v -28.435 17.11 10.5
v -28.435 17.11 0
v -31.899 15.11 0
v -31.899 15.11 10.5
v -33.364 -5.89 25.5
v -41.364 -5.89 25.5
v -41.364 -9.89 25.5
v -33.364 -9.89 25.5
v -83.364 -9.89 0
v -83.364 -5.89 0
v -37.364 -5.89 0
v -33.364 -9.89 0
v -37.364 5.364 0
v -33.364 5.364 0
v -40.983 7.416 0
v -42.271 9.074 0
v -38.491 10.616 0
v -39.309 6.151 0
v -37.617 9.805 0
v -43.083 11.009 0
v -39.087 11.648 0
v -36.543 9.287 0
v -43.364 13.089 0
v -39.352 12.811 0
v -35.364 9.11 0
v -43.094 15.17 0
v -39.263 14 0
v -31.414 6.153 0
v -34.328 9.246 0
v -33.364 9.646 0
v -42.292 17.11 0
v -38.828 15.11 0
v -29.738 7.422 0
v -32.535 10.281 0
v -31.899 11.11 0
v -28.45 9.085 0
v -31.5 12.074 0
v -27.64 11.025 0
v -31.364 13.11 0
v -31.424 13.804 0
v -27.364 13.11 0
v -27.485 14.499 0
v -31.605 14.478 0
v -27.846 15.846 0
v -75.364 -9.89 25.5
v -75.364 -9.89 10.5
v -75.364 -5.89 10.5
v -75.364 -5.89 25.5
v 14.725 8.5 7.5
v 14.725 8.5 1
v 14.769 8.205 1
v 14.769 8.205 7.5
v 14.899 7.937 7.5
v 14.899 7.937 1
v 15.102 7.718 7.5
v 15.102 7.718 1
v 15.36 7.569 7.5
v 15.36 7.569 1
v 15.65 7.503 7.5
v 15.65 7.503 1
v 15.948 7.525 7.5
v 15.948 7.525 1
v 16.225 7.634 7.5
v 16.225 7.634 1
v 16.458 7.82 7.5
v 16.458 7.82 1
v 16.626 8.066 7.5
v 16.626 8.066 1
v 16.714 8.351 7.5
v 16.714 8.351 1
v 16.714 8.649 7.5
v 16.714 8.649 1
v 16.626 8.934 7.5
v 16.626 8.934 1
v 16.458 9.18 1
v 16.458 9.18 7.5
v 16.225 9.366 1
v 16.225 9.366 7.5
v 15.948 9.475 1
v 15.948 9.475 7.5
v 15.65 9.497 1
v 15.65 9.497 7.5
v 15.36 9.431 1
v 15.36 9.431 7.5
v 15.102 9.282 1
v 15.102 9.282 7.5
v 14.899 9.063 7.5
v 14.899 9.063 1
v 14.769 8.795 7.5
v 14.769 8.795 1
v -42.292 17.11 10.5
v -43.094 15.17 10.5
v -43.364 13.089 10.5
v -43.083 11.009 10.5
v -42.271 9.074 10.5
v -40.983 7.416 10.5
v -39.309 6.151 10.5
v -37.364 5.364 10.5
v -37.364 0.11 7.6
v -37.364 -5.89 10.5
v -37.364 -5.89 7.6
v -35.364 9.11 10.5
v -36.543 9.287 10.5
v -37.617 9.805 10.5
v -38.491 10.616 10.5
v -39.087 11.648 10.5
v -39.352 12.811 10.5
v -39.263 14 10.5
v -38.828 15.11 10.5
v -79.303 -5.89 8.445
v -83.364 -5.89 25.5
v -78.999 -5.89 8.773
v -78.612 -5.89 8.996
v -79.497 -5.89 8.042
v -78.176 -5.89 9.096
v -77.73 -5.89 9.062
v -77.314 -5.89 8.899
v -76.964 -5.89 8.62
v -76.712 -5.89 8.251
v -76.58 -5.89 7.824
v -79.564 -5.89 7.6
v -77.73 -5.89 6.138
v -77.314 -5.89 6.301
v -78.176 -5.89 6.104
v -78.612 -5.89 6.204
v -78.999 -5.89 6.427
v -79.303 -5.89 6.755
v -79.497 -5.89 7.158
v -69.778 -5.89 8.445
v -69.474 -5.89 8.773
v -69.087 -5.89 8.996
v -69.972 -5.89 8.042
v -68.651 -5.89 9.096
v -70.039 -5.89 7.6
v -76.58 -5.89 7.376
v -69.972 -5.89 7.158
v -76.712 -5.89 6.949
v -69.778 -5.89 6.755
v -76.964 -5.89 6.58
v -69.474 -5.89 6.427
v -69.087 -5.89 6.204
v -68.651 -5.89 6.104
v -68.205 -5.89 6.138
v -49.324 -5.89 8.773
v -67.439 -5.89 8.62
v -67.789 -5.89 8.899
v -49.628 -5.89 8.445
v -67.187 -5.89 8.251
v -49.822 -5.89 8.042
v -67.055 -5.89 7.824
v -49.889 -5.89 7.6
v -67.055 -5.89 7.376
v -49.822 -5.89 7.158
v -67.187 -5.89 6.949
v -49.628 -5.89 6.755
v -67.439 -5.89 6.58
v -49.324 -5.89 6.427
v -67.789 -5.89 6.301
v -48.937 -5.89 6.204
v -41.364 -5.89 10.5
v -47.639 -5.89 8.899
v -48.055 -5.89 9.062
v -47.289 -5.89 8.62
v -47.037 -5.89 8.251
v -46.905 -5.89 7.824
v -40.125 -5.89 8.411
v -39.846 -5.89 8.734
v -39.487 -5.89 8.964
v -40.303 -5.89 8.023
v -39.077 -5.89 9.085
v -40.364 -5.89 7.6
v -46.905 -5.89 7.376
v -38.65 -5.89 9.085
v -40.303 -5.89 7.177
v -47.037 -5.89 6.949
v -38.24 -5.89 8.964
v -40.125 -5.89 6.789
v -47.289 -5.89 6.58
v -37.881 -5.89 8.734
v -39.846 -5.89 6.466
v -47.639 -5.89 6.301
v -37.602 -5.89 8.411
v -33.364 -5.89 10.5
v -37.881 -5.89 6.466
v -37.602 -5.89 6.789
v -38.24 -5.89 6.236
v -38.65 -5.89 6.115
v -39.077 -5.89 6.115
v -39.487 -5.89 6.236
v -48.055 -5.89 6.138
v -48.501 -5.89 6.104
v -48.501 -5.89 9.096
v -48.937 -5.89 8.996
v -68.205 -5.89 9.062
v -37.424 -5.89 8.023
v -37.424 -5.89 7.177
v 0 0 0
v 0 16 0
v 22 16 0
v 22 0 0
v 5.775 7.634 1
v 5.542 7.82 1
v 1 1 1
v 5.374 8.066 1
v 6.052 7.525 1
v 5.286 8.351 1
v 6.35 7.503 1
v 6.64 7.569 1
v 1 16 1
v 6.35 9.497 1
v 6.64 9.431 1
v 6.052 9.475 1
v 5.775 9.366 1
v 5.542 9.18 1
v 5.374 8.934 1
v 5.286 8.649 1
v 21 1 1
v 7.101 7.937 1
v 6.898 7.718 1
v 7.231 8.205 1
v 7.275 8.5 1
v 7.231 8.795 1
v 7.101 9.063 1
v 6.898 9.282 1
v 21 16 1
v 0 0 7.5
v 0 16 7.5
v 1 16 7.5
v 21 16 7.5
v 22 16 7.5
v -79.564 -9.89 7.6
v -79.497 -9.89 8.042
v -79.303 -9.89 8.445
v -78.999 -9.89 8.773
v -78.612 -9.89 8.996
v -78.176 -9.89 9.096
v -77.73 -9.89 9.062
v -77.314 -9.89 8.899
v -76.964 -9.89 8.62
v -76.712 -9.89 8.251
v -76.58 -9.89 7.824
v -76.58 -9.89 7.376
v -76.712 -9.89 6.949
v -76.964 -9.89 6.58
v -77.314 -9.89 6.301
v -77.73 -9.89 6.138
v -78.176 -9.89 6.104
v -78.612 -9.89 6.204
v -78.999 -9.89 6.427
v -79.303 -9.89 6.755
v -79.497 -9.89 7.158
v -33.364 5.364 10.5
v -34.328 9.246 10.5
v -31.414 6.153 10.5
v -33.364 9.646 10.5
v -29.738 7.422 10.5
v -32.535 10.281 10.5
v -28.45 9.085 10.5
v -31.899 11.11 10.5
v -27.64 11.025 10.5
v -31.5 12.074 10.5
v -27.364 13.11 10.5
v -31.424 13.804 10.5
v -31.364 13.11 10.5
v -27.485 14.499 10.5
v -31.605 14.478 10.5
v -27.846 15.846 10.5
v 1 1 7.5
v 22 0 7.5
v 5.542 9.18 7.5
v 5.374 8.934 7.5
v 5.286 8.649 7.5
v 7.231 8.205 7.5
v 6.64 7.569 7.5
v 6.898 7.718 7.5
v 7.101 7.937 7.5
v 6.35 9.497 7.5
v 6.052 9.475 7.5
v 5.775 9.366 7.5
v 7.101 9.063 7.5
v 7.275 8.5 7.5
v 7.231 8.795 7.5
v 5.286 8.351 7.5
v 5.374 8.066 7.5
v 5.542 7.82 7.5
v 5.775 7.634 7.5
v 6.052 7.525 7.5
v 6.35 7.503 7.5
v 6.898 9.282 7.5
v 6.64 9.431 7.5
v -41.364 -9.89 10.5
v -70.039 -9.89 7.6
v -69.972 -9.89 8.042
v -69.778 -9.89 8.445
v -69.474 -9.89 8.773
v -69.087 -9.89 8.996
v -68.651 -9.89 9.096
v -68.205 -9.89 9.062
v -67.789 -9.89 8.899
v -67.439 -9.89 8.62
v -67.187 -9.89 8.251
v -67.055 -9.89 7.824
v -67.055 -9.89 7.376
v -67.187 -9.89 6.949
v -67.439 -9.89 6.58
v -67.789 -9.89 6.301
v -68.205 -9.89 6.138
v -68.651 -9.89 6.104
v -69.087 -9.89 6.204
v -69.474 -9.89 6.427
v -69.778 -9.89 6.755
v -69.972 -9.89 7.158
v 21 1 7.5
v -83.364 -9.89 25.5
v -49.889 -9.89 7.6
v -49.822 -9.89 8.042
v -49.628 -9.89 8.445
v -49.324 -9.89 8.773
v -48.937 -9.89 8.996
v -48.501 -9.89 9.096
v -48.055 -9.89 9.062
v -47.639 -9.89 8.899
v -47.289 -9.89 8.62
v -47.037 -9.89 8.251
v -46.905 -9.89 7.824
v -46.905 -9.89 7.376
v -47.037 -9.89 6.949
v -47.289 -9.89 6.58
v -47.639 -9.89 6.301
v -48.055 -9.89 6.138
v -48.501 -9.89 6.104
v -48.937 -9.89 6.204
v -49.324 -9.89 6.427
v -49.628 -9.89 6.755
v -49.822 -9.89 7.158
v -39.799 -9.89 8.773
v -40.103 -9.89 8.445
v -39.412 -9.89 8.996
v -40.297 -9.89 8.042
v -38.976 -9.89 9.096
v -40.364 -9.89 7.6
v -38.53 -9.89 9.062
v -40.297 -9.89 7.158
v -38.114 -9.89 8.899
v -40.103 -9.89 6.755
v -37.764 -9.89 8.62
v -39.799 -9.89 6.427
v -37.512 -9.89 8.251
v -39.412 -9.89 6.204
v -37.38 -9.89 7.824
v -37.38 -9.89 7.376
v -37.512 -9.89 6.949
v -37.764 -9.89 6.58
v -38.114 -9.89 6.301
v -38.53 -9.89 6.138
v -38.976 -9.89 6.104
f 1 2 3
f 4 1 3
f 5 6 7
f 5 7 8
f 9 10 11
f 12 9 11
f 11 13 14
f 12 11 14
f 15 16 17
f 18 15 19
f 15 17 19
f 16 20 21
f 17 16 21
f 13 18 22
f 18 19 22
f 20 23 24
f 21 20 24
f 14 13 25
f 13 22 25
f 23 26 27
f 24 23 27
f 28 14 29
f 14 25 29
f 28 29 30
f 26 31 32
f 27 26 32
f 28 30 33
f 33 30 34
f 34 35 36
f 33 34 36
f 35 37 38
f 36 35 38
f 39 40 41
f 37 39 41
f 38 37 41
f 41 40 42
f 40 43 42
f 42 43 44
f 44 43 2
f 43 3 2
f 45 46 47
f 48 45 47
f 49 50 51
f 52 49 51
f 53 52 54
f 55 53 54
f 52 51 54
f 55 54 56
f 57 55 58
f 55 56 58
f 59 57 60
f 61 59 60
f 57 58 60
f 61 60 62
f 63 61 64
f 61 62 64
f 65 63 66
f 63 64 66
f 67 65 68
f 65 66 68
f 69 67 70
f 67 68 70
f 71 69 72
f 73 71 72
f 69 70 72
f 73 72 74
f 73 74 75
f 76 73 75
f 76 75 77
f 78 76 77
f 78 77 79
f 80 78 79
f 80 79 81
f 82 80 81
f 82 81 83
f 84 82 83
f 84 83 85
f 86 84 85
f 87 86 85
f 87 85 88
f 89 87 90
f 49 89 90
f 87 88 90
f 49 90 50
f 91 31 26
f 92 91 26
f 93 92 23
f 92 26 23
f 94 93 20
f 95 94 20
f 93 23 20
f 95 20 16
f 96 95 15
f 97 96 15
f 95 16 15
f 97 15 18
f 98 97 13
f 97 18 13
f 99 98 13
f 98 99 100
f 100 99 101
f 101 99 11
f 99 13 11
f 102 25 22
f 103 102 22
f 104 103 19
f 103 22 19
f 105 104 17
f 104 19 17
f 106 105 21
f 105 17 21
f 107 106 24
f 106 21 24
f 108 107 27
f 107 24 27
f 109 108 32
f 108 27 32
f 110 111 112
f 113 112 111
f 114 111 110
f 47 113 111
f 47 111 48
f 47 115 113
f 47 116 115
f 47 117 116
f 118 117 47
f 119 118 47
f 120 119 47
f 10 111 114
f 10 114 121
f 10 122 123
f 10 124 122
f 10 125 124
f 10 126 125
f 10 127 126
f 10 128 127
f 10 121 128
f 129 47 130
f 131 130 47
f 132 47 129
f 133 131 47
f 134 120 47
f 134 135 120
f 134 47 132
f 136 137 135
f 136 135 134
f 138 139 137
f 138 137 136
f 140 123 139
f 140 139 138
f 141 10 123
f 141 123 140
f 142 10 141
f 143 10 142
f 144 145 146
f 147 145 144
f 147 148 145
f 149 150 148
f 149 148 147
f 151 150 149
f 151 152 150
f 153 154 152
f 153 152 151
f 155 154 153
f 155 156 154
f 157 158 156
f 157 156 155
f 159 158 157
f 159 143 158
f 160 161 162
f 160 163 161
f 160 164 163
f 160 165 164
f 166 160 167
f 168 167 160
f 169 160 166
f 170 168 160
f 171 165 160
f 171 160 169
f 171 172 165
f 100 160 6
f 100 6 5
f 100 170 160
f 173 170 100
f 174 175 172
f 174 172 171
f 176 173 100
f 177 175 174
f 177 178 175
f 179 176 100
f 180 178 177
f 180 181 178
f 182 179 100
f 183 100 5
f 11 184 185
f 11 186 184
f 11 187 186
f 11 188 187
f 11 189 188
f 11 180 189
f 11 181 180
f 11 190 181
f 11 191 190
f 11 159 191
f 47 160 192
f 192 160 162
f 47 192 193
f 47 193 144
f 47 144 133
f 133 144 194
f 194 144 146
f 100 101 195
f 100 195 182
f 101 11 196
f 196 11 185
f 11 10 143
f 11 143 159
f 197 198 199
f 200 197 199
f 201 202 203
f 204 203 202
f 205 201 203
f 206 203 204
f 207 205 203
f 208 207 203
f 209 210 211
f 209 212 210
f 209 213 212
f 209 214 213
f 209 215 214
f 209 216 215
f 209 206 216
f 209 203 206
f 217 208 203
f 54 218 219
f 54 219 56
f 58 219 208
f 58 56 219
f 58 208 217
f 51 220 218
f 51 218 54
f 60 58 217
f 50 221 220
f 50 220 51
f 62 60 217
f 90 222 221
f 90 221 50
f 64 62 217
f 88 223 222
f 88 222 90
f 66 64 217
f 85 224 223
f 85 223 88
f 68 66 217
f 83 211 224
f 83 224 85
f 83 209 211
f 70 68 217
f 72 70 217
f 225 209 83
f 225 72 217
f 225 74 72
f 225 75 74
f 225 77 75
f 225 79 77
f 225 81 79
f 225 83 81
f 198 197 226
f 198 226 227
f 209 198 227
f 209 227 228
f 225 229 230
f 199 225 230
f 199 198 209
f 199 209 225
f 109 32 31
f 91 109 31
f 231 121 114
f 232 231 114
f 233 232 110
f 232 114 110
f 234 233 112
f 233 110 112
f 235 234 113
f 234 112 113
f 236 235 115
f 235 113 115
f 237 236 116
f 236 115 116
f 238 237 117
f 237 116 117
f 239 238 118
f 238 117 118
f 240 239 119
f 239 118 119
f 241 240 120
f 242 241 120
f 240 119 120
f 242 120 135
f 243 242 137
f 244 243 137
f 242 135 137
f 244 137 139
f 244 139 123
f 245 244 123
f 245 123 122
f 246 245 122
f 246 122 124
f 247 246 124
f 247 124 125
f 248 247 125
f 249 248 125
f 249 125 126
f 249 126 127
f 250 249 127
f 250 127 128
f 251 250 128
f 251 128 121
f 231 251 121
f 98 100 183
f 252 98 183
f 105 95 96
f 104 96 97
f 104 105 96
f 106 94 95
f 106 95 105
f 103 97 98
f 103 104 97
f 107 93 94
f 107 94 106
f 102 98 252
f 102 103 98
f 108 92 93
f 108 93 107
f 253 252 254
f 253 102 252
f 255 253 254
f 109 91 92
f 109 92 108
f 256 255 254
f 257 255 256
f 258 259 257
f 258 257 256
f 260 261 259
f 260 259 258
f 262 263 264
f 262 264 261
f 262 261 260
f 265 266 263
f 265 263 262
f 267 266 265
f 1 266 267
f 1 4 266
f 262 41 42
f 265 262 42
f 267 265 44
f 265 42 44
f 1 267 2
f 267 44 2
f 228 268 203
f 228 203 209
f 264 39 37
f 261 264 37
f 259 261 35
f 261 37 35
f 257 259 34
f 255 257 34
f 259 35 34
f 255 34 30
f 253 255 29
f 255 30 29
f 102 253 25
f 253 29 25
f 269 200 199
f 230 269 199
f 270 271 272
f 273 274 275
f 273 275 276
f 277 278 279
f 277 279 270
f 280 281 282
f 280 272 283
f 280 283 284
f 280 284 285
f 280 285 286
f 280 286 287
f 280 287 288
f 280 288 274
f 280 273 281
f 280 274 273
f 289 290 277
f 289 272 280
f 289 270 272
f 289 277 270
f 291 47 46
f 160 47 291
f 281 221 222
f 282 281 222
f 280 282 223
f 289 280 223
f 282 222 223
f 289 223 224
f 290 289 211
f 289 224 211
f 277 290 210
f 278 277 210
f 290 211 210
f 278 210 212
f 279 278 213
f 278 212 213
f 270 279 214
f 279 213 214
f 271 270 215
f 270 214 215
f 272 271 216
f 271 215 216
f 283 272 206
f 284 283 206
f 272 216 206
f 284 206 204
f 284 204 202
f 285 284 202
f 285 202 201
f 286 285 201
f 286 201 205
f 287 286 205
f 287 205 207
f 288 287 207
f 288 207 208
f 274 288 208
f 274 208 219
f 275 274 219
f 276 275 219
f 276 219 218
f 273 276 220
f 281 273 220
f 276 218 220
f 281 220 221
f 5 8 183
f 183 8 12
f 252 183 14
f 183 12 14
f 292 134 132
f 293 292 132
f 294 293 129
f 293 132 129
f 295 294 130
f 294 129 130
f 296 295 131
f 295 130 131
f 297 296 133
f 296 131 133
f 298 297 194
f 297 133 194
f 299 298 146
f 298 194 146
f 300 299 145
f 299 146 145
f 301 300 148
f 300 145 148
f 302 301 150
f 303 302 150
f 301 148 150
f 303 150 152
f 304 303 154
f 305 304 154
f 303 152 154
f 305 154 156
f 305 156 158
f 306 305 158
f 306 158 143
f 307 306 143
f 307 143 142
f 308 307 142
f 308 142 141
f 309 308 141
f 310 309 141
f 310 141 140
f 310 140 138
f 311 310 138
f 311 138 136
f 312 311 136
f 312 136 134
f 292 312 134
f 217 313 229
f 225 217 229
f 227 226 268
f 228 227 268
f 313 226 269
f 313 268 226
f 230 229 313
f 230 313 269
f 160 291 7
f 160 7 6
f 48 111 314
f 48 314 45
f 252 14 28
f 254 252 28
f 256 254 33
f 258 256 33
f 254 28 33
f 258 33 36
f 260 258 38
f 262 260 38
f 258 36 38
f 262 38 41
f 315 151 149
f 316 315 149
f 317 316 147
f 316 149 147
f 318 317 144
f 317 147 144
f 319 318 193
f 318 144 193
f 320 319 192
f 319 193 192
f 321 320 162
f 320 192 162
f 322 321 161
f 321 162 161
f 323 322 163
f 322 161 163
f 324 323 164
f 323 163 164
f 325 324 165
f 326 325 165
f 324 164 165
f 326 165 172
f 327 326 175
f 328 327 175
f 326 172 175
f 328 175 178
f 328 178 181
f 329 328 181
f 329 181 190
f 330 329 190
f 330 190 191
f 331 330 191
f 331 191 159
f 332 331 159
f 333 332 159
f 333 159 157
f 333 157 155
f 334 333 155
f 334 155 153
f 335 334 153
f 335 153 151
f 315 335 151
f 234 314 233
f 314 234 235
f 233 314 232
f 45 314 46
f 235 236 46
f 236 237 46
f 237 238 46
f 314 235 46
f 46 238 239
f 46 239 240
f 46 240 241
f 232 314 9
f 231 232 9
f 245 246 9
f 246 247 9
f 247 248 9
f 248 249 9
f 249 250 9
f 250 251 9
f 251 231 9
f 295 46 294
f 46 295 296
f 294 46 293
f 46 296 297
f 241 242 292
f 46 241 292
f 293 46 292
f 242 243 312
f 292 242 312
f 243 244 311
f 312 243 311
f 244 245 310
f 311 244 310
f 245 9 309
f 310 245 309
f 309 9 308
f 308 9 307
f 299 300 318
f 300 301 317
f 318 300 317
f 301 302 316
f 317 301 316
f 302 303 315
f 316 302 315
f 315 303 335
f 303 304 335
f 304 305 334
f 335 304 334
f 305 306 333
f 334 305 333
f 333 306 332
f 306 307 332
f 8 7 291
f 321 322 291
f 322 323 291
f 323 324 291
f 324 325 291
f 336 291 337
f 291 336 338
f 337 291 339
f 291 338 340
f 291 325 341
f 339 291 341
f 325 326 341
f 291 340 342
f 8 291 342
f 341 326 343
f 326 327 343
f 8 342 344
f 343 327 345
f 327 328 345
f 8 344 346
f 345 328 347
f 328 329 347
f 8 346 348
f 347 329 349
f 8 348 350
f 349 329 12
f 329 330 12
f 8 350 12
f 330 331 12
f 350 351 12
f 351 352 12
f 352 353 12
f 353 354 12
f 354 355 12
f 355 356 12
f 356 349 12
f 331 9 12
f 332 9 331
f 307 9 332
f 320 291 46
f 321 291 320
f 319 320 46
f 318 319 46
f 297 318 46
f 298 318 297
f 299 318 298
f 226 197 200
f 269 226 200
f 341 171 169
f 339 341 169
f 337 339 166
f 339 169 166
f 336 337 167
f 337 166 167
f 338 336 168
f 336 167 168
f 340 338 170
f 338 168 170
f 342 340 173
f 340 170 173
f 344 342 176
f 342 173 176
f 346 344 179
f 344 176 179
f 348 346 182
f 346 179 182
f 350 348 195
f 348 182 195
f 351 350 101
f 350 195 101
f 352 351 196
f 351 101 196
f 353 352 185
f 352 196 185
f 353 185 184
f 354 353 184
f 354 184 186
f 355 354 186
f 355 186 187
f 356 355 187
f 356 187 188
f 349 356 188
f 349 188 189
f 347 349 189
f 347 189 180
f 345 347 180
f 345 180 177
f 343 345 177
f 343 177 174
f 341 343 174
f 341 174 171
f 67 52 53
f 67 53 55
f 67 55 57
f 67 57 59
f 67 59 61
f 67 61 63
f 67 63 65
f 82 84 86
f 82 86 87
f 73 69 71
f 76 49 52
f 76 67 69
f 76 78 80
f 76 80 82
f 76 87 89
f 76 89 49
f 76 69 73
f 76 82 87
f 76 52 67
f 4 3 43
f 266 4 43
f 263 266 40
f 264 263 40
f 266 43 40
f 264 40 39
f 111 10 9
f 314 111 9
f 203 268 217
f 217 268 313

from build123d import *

# Parameters (mm, degrees)
F0_W      = 22
F0_H      = 16
F1_DEPTH  = 7.5
F2_W      = 20
F2_H      = 15
F3_DEPTH  = 6.5
F5_DEPTH  = 6.5
F7_DEPTH  = 10.5
F9_W      = 8
F9_H      = 4
F10_DEPTH = 15
F12_D     = 3
F12_DEPTH = 10
F12_TIP   = 0.9012909285


# Not quite as in the source:
# - a feature names something its author has since deleted; it is built from what else it names


with BuildPart() as f1:
    # F0 (on Top) → F1 (new body)
    with BuildSketch(Plane.XY):
        with Locations((11, 8)):
            Rectangle(F0_W, F0_H)
    extrude(amount=F1_DEPTH)

    # F2 (on face) → F3 (cut)
    with BuildSketch(Plane.XY.offset(7.5)):
        with Locations((11, 8.5)):
            Rectangle(F2_W, F2_H)
    extrude(amount=-F3_DEPTH, mode=Mode.SUBTRACT)

    # F4 (on face) → F5 (join)
    with BuildSketch(Plane.XY.offset(1)):
        with BuildLine():
            ThreePointArc((5.275, 8.5), (6.275, 7.5), (7.275, 8.5))
            Line((7.275, 8.5), (5.275, 8.5))
        make_face()
        with BuildLine():
            Line((5.275, 8.5), (7.275, 8.5))
            ThreePointArc((7.275, 8.5), (6.275, 9.5), (5.275, 8.5))
        make_face()
        with BuildLine():
            ThreePointArc((16.725, 8.5), (15.725, 9.5), (14.725, 8.5))
            Line((14.725, 8.5), (16.725, 8.5))
        make_face()
        with BuildLine():
            Line((16.725, 8.5), (14.725, 8.5))
            ThreePointArc((14.725, 8.5), (15.725, 7.5), (16.725, 8.5))
        make_face()
    extrude(amount=F5_DEPTH)


with BuildPart() as f7:
    # F6 (on Top) → F7 (new body)
    with BuildSketch(Plane.XY):
        with BuildLine():
            Line((0.0722974215, 15.1097724214), (-3.3918041936, 17.1097724214))
            ThreePointArc((-3.3918041936, 17.1097724214), (-3.8406014795, 10.0146369826), (1.5363990366, 5.363805729))
            Line((1.5363990366, 5.363805729), (1.5363990366, 9.1097724214))
            Line((1.5363990366, 9.1097724214), (3.5363990366, 9.1097724214))
            ThreePointArc((3.5363990366, 9.1097724214), (0.0722974215, 11.1097724214), (0.0722974215, 15.1097724214))
        make_face()
        with BuildLine():
            ThreePointArc((3.5363990366, 5.1097724214), (4.5444333765, 5.1735348513), (5.5363990366, 5.363805729))
            Line((5.5363990366, 5.363805729), (5.5363990366, 9.1097724214))
            Line((5.5363990366, 9.1097724214), (3.5363990366, 9.1097724214))
            Line((3.5363990366, 9.1097724214), (3.5363990366, 5.1097724214))
        make_face()
        with BuildLine():
            ThreePointArc((1.5363990366, 5.363805729), (2.5283646968, 5.1735348513), (3.5363990366, 5.1097724214))
            Line((3.5363990366, 5.1097724214), (3.5363990366, 9.1097724214))
            Line((3.5363990366, 9.1097724214), (1.5363990366, 9.1097724214))
            Line((1.5363990366, 9.1097724214), (1.5363990366, 5.363805729))
        make_face()
        with BuildLine():
            ThreePointArc((5.5363990366, 5.363805729), (9.860954357, 8.2107929359), (11.5363990366, 13.1097724214))
            ThreePointArc((11.5363990366, 13.1097724214), (11.263805647, 15.1803247822), (10.4646022669, 17.1097724214))
            Line((10.4646022669, 17.1097724214), (7.0005006518, 15.1097724214))
            ThreePointArc((7.0005006518, 15.1097724214), (7.4001023418, 14.1450486018), (7.5363990366, 13.1097724214))
            ThreePointArc((7.5363990366, 13.1097724214), (6.3648261614, 10.2813452967), (3.5363990366, 9.1097724214))
            Line((3.5363990366, 9.1097724214), (5.5363990366, 9.1097724214))
            Line((5.5363990366, 9.1097724214), (5.5363990366, 5.363805729))
        make_face()
        with BuildLine():
            Line((5.5363990366, -5.8902275786), (5.5363990366, 5.363805729))
            ThreePointArc((5.5363990366, 5.363805729), (4.5444333765, 5.1735348513), (3.5363990366, 5.1097724214))
            Line((3.5363990366, 5.1097724214), (3.5363990366, -5.8902275786))
            Line((3.5363990366, -5.8902275786), (5.5363990366, -5.8902275786))
        make_face()
        with BuildLine():
            Line((3.5363990366, -5.8902275786), (3.5363990366, 5.1097724214))
            ThreePointArc((3.5363990366, 5.1097724214), (2.5283646968, 5.1735348513), (1.5363990366, 5.363805729))
            Line((1.5363990366, 5.363805729), (1.5363990366, -5.8902275786))
            Line((1.5363990366, -5.8902275786), (3.5363990366, -5.8902275786))
        make_face()
        Polygon((5.5363990366, -9.8902275786), (5.5363990366, -5.8902275786), (3.5363990366, -5.8902275786), (1.5363990366, -5.8902275786), (-44.4636009634, -5.8902275786), (-44.4636009634, -9.8902275786), align=None)
    extrude(amount=F7_DEPTH)


with BuildPart() as f7_1:
    # F8: moved
    add(f7.part.moved(Location((-38.9, 0, 0))))

    # F9 (on face) → F10 (join)
    with BuildSketch(Plane.XY.offset(10.5)):
        with Locations((-37.3636009634, -7.8902275786)):
            Rectangle(F9_W, F9_H)
        with Locations((-79.3636009634, -7.8902275786)):
            Rectangle(F9_W, F9_H)
    extrude(amount=F10_DEPTH)

    # F12
    with Locations(Plane.XZ.offset(9.8902275786)):
        with Locations((-78.0636009634, 7.6), (-68.5386009634, 7.6), (-48.3886009634, 7.6), (-38.8636009634, 7.6)):
            Hole(F12_D / 2, depth=F12_DEPTH)
            with Locations((0, 0, -(F12_DEPTH + F12_TIP / 2))):  # 118° drill point
                Cone(0, F12_D / 2, F12_TIP, mode=Mode.SUBTRACT)


solid = Compound([f1.part, f7_1.part])
